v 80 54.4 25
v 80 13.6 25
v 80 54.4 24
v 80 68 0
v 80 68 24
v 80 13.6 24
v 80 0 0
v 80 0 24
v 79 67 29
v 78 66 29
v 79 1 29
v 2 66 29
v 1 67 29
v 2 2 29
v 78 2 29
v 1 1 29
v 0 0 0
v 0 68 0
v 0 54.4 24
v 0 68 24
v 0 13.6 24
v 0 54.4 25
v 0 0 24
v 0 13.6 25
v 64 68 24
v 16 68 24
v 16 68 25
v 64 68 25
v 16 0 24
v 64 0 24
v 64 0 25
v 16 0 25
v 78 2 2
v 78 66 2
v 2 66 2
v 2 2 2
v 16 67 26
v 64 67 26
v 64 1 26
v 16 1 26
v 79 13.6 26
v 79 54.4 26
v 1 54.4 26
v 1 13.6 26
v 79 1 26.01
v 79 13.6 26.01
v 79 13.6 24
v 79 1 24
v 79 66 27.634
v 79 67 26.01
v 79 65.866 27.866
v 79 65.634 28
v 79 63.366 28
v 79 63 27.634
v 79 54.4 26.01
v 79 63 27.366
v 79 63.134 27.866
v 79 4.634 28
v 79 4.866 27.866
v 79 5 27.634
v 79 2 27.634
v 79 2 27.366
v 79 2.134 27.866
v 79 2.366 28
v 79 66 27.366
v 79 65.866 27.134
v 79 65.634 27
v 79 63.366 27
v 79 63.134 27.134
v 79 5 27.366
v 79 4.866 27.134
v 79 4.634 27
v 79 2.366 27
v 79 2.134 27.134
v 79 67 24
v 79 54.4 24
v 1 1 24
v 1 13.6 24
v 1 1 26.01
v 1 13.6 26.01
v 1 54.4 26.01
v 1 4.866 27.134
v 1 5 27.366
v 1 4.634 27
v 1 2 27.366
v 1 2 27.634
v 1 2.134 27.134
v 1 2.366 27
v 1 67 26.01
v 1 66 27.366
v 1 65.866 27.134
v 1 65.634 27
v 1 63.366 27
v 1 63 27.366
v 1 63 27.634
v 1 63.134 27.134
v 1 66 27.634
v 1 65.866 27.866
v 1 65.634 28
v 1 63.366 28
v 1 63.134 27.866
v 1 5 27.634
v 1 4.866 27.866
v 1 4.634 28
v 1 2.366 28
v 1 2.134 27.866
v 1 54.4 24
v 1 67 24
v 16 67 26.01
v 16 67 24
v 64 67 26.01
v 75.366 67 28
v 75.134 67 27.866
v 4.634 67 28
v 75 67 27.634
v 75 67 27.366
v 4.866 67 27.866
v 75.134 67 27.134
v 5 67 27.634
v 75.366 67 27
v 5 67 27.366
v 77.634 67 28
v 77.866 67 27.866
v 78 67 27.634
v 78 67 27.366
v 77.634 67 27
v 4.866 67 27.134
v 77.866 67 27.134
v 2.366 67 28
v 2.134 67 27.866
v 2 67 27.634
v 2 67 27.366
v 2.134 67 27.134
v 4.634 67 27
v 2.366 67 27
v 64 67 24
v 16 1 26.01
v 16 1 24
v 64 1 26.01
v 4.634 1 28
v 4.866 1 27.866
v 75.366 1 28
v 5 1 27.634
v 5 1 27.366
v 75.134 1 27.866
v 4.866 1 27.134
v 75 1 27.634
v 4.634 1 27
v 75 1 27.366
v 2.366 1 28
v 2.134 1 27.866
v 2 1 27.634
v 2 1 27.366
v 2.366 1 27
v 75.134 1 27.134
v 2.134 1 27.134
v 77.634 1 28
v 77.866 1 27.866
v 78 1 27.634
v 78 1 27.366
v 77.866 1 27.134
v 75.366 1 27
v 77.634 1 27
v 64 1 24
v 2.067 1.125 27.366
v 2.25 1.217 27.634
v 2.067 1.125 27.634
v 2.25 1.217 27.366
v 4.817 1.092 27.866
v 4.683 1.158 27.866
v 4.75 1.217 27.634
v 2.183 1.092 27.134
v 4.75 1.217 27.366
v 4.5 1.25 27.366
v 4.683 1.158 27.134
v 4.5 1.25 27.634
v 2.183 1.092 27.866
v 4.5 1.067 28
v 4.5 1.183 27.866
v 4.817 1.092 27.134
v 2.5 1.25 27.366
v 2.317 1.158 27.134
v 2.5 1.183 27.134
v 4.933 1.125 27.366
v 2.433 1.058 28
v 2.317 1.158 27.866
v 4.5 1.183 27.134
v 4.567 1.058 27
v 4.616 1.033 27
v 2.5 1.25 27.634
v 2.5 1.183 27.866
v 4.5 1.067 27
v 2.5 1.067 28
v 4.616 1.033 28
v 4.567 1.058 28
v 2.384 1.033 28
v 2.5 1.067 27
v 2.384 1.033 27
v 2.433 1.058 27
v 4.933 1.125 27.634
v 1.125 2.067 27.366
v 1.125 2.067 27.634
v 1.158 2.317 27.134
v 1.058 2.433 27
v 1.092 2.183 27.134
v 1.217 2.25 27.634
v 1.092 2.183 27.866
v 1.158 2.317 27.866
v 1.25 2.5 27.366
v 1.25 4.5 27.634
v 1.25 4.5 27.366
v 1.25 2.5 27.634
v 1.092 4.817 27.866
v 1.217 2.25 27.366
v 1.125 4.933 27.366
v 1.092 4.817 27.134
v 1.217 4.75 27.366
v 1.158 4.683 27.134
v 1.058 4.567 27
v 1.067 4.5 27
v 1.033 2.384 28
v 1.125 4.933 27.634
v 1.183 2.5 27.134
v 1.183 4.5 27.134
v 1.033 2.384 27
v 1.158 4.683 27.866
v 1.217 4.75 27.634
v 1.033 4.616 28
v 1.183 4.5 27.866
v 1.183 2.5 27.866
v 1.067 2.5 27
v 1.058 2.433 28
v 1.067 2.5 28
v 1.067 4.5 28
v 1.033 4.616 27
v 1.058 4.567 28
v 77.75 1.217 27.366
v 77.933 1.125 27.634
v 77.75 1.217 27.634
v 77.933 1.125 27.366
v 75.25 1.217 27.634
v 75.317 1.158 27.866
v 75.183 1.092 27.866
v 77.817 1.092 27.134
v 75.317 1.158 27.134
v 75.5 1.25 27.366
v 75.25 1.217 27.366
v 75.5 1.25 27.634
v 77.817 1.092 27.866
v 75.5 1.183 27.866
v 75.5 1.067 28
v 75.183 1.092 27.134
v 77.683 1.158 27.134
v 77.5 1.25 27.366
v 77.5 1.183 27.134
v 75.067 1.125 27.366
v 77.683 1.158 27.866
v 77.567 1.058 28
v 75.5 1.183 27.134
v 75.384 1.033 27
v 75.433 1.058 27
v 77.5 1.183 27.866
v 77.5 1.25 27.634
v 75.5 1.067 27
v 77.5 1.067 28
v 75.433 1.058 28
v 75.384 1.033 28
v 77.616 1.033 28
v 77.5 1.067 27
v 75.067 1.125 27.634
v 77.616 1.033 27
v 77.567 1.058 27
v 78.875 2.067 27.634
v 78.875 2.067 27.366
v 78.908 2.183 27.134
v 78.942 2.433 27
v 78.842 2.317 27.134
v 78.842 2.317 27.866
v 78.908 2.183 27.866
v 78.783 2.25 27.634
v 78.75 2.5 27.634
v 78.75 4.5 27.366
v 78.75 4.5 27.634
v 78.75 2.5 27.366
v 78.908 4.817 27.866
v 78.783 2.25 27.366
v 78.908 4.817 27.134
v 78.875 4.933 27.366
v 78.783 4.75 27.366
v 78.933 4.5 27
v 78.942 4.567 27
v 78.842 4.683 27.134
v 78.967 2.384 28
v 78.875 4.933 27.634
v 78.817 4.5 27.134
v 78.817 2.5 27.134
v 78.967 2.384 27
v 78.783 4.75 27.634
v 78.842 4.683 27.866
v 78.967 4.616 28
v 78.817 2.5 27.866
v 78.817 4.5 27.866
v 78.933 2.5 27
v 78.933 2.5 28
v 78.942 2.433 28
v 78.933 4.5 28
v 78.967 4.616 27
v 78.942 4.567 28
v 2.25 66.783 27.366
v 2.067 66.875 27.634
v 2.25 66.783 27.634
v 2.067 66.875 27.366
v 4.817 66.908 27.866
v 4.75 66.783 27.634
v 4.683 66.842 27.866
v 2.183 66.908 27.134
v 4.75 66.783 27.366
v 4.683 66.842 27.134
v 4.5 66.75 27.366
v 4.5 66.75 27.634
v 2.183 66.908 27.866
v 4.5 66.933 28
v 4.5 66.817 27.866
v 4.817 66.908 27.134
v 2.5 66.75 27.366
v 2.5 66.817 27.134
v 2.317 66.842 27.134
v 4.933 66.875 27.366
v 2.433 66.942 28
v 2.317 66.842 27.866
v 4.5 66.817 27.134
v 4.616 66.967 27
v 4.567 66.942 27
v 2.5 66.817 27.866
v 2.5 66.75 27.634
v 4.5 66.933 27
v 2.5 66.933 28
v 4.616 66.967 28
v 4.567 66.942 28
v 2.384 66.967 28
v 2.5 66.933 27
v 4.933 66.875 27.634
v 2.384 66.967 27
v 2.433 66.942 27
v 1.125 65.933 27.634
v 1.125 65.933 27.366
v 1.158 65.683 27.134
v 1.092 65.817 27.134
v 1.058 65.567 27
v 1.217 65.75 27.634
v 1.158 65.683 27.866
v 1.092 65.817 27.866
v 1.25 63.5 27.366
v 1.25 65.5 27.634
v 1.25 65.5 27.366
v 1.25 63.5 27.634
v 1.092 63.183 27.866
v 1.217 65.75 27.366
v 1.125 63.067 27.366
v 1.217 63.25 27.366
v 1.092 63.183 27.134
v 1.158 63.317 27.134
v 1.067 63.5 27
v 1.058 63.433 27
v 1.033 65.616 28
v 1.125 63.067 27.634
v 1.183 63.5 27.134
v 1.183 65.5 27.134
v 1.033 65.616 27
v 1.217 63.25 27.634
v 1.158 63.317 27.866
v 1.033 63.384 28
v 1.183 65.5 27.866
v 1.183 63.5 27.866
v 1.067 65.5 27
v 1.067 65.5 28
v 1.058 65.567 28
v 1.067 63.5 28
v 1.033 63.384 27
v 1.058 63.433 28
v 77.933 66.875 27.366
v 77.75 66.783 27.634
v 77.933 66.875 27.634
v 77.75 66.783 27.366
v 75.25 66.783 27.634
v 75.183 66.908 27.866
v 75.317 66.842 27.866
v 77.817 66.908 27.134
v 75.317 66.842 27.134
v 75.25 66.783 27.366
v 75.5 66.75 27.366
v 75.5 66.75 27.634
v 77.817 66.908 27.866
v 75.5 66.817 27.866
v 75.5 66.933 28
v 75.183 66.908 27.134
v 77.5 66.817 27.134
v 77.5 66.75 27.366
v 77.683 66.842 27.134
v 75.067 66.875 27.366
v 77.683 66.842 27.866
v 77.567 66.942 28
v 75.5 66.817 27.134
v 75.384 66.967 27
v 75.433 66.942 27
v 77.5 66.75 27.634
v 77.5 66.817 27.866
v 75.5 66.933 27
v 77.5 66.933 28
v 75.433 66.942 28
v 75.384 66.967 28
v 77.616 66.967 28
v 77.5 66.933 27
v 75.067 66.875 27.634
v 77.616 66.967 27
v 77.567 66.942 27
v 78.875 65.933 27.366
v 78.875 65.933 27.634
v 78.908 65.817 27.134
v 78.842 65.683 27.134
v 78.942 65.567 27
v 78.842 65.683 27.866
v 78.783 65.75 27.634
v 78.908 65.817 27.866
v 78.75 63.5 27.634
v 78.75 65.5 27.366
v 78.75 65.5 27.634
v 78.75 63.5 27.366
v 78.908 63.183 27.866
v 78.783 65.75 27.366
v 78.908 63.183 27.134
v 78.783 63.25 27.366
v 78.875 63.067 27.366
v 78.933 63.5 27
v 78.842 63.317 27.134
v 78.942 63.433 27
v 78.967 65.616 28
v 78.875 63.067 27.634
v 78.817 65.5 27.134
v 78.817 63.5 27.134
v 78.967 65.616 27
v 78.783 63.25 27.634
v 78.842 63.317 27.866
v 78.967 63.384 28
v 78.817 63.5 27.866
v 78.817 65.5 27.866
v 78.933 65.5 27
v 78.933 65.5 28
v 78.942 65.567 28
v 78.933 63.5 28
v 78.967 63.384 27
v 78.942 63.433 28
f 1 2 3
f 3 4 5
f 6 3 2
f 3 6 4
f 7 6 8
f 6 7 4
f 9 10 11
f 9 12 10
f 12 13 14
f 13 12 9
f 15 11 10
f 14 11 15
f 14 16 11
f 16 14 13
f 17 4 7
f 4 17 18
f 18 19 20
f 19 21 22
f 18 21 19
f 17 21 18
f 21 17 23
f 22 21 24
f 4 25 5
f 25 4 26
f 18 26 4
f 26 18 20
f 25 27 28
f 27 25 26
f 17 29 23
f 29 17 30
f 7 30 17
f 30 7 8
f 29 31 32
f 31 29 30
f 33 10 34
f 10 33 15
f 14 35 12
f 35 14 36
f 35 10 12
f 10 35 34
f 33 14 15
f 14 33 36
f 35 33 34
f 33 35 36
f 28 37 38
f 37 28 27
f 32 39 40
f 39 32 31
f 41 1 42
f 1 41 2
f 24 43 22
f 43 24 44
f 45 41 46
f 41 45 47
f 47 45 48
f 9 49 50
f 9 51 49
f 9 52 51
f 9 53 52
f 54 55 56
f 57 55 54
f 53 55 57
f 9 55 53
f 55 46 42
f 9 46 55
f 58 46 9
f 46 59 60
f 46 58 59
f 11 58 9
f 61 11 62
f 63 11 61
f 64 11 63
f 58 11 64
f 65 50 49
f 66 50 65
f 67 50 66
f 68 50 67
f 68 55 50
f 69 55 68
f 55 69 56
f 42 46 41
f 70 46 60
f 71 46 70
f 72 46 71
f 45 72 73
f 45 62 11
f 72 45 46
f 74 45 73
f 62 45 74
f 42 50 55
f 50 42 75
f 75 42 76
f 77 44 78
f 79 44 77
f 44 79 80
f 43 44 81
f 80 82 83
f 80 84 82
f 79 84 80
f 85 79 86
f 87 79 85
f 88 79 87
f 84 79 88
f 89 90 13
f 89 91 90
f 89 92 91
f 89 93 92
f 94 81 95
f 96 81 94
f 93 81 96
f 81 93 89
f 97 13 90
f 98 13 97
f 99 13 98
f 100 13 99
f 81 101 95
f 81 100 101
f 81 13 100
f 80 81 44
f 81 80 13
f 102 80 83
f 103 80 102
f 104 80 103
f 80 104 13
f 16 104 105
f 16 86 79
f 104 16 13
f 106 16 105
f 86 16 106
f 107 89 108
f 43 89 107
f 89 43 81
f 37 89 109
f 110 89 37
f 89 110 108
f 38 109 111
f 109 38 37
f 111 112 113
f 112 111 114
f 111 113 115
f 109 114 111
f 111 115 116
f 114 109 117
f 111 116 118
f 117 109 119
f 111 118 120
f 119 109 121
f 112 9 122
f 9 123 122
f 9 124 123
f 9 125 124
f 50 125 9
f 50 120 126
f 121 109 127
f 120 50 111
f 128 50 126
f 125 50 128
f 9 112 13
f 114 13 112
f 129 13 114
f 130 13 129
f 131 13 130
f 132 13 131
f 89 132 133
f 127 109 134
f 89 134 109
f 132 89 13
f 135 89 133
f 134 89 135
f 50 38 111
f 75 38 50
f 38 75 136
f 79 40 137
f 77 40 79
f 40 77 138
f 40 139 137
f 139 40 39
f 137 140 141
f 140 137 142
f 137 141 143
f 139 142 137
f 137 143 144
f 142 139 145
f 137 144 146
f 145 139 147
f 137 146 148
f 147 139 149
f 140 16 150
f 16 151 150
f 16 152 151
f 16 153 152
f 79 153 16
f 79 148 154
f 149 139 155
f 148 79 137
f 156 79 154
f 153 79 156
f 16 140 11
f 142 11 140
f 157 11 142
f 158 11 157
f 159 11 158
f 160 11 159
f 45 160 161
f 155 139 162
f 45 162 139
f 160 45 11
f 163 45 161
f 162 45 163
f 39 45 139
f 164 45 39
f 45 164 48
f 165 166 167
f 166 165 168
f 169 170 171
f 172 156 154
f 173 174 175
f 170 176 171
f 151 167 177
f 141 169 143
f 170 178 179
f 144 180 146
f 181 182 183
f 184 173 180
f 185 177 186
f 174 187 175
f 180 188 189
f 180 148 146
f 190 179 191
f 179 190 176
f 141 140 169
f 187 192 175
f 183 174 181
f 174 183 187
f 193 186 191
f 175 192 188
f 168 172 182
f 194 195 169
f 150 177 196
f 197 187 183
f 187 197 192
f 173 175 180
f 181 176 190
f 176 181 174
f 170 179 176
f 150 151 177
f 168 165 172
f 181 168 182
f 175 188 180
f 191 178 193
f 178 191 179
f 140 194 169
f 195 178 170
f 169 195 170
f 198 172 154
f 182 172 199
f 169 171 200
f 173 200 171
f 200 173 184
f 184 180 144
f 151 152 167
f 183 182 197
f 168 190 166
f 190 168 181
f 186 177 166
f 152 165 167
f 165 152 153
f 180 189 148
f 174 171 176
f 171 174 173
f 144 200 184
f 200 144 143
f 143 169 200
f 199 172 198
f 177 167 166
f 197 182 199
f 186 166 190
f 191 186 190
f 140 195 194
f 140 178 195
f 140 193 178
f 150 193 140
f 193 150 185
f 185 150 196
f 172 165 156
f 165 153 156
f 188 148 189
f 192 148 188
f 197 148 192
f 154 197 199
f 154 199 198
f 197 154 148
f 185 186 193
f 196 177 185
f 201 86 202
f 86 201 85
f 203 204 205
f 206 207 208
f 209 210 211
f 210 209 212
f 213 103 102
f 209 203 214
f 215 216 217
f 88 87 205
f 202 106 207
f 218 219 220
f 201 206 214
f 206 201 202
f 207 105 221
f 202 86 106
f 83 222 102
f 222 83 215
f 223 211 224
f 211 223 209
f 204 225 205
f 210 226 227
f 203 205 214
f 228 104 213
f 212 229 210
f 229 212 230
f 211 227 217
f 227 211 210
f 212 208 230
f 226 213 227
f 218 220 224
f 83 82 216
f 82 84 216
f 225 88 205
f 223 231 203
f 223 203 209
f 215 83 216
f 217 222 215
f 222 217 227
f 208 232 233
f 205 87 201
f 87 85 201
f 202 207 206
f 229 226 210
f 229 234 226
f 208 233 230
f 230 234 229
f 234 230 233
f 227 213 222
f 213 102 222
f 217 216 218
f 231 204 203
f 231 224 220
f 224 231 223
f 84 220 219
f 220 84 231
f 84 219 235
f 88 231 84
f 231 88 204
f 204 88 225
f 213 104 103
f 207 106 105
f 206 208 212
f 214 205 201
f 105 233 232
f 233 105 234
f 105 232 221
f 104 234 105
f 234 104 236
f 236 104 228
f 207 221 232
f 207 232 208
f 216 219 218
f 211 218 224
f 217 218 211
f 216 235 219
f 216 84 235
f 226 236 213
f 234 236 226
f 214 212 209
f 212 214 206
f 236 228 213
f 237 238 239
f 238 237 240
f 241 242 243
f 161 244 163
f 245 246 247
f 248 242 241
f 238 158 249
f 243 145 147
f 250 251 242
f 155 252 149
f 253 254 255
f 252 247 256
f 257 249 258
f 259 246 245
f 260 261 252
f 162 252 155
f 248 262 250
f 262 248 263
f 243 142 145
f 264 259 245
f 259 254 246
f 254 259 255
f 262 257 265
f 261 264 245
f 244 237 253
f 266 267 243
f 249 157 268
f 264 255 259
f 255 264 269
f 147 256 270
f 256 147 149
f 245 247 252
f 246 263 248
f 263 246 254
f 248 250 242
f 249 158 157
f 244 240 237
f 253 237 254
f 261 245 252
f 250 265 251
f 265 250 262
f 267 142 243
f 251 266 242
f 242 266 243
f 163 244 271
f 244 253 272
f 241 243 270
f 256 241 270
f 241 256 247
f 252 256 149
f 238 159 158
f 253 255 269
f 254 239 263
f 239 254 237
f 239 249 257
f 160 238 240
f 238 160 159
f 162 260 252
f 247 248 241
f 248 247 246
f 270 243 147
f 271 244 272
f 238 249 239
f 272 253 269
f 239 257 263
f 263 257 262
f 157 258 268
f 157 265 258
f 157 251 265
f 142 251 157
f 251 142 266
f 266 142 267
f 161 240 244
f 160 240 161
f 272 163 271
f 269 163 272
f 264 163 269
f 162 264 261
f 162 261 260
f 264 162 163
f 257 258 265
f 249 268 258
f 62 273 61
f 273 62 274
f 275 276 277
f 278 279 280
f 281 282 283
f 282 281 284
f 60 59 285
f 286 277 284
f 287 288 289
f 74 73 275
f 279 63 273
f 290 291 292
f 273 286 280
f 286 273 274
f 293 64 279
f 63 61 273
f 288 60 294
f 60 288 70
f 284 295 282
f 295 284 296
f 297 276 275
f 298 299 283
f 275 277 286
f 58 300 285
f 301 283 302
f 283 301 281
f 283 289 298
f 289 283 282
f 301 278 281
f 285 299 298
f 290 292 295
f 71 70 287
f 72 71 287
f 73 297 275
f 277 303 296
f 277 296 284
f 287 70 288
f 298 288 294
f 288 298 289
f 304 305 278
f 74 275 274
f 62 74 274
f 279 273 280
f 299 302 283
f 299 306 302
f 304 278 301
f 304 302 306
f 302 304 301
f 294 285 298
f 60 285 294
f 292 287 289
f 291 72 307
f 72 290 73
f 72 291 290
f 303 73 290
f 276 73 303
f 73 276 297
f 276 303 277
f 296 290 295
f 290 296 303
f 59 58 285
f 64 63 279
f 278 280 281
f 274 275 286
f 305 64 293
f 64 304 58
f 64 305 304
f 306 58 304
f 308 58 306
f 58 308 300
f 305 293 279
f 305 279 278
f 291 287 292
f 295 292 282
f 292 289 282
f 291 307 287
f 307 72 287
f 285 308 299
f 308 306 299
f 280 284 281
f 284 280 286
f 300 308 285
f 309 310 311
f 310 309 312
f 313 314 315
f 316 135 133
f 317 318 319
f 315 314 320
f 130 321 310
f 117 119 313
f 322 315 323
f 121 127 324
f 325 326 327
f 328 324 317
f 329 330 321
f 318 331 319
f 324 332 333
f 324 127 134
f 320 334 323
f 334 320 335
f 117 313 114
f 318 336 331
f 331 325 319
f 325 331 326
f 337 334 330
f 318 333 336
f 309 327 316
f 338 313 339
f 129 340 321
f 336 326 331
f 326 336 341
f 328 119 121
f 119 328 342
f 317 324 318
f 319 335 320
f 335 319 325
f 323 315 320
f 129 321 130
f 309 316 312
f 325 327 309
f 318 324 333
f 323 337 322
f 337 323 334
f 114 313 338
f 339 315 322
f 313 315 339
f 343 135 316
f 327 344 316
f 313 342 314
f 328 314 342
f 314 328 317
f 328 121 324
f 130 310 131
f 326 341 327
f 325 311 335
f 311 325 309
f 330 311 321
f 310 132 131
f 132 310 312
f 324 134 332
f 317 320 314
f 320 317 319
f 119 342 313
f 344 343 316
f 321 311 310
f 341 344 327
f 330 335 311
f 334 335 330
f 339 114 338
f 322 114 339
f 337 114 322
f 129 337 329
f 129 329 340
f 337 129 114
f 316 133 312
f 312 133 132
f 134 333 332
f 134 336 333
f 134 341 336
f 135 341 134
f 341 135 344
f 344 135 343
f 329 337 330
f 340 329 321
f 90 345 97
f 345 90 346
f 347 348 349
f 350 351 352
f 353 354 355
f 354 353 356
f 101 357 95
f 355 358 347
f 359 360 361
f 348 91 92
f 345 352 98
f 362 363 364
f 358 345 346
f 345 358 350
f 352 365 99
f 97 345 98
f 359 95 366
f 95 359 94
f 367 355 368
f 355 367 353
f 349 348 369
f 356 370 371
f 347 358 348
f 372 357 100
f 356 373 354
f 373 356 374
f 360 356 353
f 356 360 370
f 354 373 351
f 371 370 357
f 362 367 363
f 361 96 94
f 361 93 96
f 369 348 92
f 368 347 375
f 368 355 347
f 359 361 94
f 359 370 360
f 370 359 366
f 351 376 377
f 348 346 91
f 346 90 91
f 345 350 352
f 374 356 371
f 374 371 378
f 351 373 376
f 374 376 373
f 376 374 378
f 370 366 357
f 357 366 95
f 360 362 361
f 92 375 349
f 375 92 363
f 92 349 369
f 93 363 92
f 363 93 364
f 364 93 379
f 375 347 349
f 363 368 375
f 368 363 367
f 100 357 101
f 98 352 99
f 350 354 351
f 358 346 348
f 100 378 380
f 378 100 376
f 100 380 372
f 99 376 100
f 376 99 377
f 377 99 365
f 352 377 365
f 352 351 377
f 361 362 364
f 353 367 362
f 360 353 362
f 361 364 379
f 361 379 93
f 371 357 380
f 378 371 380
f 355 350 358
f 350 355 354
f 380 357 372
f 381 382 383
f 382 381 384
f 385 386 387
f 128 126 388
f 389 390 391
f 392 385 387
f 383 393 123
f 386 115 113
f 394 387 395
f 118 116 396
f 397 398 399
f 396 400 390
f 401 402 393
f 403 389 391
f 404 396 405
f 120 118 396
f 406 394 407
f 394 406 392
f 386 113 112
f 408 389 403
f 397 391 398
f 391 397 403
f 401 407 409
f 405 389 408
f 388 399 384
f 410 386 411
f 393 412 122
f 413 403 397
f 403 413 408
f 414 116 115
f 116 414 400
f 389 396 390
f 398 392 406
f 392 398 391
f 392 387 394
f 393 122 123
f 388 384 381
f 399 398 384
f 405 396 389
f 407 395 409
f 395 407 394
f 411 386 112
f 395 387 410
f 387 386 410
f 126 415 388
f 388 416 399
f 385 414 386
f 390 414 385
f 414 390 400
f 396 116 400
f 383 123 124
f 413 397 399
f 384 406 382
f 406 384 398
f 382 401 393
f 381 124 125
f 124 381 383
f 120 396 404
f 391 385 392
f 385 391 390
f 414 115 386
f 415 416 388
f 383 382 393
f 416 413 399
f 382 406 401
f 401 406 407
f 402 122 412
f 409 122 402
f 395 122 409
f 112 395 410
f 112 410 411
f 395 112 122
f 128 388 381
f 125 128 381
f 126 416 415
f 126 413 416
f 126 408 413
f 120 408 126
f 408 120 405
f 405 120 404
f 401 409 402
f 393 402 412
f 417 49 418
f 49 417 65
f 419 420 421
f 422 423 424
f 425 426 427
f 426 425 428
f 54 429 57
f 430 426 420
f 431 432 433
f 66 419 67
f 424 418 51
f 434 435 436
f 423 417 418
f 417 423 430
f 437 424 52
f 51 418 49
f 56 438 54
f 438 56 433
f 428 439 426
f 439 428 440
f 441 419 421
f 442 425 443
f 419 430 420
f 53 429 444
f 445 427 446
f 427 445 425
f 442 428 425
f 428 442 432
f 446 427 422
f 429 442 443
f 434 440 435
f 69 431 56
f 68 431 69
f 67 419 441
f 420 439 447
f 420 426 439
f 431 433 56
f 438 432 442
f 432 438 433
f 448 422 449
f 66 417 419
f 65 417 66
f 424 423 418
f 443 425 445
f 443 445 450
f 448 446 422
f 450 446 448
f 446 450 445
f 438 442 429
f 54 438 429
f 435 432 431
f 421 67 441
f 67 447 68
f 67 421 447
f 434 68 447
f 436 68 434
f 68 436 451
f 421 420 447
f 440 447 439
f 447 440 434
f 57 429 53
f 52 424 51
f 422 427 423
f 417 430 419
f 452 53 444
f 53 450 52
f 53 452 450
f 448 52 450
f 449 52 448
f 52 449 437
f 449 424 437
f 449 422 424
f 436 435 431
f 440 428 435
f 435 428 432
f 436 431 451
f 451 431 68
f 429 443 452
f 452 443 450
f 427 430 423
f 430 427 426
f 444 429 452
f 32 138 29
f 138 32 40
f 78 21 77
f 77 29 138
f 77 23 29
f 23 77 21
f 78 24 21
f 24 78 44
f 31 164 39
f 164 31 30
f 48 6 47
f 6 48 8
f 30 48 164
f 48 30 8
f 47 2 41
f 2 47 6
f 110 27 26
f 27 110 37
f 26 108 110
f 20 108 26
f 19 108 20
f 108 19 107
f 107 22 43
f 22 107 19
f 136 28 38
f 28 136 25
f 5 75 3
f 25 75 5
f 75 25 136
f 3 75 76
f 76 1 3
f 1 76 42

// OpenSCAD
insert_font = "Libre Baskerville:style=Regular";

include <../../The-Boardgame-Insert-Toolkit/boardgame_insert_toolkit_lib.2.scad>;
include <../../BFD-Insert-Extensions/InsertExtensions.scad>;



g_b_print_lid = false;
g_b_print_box = true; 
g_wall_thickness = 2.0;
g_lid_thickness = 2.0;
g_min_bottom_thickness = 1.0;

// The tolerance value is extra space put between planes of the lid and box that fit together.
// Increase the tolerance to loosen the fit and decrease it to tighten it.
//
// Note that the tolerance is applied exclusively to the lid.
// So if the lid is too tight or too loose, change this value ( up for looser fit, down for tighter fit ) and 
// you only need to reprint the lid.
// 
// The exception is the stackable box, where the bottom of the box is the lid of the box below,
// in which case the tolerance also affects that box bottom.
//
g_tolerance = 0.25;

// This adjusts the position of the lid detents downward. 
// The larger the value, the bigger the gap between the lid and the box.
g_tolerance_detents_pos = 0.1;
card_sizes = [[64,89],[65,112],[50,65],[64,64],[22,65],[64,68]];
card_width = 64;
card_height = 89;

function personnelFiles() = cardBox("Personnel Files", ["Personnel","Files"], 35, "" , 10,card=0);

function baseDice() = standardBox2("Base Dice", ["Base Dice"], 16.5, "" , 10,0,0,card=1);

function advancedDice() = standardBox2("Advanced Dice", ["Advanced","Dice"], 16.5, "" , 8,0,0,card=2);

function injuryDice() = standardBox2("Injury Dice", ["Injury","Dice"], 16.5, "" , 8,0,0,card=2);

function standeeBases() = standardBox2("Standee Bases", ["Standee","Bases"], 10, "" , 8,0,0,card=2);

function baseRings() = standardBox2("Base Rings", ["Base","Rings"], 5.5, "" , 8,0,0,card=3);

function universalBox() = bowlGrid( "Universal Markers", [1,1],["Universal","Markers"], 9, 90, 50, 65,19, "",radius=12,lid=true,fit_under=true);

function tokenBox() = standardBox2("Token Box", ["Token","Box"], 11, "" , 10,0,0,card=3);

function otherDice() = standardBox2("Other Dice", ["Other Dice"], 18, "" , 8,0,0,card=4);

function equipmentTokens() = standardBox2("Equipment Tokens", ["Equipment","Tokens"], 15.5, "" , 8,0,0,card=5);

function standees() = gridBox( "Standees", [1,1], ["Standees"], 12,0,81,64,27);

function otherStuff() = gridBox( "Other Stuff", [1,1], ["Other","Stuff"], 12,0,76,64,27);

tsbCompartmentSizes = [[50,35,15],[50,25,15]];
tsbCompartmentPositions = [[0,0],[0,36]];
function timeSuccessBox() = freeFormBox3( "Time & Success Box",tsbCompartmentPositions,tsbCompartmentSizes, 54,65, 17,label_data=["Time &","Success"],label_size=8,label_rotation=90,shape=BOWL,fillet_radius=8,fit_under=true);

g_isolated_print_box = "Other Stuff"; 

 
 data = [
    personnelFiles(),
    baseDice(),
    advancedDice(),
    injuryDice(),
    standeeBases(),
    baseRings(),
    universalBox(),
    tokenBox(),
    timeSuccessBox(),
    otherDice(),
    equipmentTokens(),
    standees(),
    otherStuff(),
 ];
 

 
MakeAll();
 
 
